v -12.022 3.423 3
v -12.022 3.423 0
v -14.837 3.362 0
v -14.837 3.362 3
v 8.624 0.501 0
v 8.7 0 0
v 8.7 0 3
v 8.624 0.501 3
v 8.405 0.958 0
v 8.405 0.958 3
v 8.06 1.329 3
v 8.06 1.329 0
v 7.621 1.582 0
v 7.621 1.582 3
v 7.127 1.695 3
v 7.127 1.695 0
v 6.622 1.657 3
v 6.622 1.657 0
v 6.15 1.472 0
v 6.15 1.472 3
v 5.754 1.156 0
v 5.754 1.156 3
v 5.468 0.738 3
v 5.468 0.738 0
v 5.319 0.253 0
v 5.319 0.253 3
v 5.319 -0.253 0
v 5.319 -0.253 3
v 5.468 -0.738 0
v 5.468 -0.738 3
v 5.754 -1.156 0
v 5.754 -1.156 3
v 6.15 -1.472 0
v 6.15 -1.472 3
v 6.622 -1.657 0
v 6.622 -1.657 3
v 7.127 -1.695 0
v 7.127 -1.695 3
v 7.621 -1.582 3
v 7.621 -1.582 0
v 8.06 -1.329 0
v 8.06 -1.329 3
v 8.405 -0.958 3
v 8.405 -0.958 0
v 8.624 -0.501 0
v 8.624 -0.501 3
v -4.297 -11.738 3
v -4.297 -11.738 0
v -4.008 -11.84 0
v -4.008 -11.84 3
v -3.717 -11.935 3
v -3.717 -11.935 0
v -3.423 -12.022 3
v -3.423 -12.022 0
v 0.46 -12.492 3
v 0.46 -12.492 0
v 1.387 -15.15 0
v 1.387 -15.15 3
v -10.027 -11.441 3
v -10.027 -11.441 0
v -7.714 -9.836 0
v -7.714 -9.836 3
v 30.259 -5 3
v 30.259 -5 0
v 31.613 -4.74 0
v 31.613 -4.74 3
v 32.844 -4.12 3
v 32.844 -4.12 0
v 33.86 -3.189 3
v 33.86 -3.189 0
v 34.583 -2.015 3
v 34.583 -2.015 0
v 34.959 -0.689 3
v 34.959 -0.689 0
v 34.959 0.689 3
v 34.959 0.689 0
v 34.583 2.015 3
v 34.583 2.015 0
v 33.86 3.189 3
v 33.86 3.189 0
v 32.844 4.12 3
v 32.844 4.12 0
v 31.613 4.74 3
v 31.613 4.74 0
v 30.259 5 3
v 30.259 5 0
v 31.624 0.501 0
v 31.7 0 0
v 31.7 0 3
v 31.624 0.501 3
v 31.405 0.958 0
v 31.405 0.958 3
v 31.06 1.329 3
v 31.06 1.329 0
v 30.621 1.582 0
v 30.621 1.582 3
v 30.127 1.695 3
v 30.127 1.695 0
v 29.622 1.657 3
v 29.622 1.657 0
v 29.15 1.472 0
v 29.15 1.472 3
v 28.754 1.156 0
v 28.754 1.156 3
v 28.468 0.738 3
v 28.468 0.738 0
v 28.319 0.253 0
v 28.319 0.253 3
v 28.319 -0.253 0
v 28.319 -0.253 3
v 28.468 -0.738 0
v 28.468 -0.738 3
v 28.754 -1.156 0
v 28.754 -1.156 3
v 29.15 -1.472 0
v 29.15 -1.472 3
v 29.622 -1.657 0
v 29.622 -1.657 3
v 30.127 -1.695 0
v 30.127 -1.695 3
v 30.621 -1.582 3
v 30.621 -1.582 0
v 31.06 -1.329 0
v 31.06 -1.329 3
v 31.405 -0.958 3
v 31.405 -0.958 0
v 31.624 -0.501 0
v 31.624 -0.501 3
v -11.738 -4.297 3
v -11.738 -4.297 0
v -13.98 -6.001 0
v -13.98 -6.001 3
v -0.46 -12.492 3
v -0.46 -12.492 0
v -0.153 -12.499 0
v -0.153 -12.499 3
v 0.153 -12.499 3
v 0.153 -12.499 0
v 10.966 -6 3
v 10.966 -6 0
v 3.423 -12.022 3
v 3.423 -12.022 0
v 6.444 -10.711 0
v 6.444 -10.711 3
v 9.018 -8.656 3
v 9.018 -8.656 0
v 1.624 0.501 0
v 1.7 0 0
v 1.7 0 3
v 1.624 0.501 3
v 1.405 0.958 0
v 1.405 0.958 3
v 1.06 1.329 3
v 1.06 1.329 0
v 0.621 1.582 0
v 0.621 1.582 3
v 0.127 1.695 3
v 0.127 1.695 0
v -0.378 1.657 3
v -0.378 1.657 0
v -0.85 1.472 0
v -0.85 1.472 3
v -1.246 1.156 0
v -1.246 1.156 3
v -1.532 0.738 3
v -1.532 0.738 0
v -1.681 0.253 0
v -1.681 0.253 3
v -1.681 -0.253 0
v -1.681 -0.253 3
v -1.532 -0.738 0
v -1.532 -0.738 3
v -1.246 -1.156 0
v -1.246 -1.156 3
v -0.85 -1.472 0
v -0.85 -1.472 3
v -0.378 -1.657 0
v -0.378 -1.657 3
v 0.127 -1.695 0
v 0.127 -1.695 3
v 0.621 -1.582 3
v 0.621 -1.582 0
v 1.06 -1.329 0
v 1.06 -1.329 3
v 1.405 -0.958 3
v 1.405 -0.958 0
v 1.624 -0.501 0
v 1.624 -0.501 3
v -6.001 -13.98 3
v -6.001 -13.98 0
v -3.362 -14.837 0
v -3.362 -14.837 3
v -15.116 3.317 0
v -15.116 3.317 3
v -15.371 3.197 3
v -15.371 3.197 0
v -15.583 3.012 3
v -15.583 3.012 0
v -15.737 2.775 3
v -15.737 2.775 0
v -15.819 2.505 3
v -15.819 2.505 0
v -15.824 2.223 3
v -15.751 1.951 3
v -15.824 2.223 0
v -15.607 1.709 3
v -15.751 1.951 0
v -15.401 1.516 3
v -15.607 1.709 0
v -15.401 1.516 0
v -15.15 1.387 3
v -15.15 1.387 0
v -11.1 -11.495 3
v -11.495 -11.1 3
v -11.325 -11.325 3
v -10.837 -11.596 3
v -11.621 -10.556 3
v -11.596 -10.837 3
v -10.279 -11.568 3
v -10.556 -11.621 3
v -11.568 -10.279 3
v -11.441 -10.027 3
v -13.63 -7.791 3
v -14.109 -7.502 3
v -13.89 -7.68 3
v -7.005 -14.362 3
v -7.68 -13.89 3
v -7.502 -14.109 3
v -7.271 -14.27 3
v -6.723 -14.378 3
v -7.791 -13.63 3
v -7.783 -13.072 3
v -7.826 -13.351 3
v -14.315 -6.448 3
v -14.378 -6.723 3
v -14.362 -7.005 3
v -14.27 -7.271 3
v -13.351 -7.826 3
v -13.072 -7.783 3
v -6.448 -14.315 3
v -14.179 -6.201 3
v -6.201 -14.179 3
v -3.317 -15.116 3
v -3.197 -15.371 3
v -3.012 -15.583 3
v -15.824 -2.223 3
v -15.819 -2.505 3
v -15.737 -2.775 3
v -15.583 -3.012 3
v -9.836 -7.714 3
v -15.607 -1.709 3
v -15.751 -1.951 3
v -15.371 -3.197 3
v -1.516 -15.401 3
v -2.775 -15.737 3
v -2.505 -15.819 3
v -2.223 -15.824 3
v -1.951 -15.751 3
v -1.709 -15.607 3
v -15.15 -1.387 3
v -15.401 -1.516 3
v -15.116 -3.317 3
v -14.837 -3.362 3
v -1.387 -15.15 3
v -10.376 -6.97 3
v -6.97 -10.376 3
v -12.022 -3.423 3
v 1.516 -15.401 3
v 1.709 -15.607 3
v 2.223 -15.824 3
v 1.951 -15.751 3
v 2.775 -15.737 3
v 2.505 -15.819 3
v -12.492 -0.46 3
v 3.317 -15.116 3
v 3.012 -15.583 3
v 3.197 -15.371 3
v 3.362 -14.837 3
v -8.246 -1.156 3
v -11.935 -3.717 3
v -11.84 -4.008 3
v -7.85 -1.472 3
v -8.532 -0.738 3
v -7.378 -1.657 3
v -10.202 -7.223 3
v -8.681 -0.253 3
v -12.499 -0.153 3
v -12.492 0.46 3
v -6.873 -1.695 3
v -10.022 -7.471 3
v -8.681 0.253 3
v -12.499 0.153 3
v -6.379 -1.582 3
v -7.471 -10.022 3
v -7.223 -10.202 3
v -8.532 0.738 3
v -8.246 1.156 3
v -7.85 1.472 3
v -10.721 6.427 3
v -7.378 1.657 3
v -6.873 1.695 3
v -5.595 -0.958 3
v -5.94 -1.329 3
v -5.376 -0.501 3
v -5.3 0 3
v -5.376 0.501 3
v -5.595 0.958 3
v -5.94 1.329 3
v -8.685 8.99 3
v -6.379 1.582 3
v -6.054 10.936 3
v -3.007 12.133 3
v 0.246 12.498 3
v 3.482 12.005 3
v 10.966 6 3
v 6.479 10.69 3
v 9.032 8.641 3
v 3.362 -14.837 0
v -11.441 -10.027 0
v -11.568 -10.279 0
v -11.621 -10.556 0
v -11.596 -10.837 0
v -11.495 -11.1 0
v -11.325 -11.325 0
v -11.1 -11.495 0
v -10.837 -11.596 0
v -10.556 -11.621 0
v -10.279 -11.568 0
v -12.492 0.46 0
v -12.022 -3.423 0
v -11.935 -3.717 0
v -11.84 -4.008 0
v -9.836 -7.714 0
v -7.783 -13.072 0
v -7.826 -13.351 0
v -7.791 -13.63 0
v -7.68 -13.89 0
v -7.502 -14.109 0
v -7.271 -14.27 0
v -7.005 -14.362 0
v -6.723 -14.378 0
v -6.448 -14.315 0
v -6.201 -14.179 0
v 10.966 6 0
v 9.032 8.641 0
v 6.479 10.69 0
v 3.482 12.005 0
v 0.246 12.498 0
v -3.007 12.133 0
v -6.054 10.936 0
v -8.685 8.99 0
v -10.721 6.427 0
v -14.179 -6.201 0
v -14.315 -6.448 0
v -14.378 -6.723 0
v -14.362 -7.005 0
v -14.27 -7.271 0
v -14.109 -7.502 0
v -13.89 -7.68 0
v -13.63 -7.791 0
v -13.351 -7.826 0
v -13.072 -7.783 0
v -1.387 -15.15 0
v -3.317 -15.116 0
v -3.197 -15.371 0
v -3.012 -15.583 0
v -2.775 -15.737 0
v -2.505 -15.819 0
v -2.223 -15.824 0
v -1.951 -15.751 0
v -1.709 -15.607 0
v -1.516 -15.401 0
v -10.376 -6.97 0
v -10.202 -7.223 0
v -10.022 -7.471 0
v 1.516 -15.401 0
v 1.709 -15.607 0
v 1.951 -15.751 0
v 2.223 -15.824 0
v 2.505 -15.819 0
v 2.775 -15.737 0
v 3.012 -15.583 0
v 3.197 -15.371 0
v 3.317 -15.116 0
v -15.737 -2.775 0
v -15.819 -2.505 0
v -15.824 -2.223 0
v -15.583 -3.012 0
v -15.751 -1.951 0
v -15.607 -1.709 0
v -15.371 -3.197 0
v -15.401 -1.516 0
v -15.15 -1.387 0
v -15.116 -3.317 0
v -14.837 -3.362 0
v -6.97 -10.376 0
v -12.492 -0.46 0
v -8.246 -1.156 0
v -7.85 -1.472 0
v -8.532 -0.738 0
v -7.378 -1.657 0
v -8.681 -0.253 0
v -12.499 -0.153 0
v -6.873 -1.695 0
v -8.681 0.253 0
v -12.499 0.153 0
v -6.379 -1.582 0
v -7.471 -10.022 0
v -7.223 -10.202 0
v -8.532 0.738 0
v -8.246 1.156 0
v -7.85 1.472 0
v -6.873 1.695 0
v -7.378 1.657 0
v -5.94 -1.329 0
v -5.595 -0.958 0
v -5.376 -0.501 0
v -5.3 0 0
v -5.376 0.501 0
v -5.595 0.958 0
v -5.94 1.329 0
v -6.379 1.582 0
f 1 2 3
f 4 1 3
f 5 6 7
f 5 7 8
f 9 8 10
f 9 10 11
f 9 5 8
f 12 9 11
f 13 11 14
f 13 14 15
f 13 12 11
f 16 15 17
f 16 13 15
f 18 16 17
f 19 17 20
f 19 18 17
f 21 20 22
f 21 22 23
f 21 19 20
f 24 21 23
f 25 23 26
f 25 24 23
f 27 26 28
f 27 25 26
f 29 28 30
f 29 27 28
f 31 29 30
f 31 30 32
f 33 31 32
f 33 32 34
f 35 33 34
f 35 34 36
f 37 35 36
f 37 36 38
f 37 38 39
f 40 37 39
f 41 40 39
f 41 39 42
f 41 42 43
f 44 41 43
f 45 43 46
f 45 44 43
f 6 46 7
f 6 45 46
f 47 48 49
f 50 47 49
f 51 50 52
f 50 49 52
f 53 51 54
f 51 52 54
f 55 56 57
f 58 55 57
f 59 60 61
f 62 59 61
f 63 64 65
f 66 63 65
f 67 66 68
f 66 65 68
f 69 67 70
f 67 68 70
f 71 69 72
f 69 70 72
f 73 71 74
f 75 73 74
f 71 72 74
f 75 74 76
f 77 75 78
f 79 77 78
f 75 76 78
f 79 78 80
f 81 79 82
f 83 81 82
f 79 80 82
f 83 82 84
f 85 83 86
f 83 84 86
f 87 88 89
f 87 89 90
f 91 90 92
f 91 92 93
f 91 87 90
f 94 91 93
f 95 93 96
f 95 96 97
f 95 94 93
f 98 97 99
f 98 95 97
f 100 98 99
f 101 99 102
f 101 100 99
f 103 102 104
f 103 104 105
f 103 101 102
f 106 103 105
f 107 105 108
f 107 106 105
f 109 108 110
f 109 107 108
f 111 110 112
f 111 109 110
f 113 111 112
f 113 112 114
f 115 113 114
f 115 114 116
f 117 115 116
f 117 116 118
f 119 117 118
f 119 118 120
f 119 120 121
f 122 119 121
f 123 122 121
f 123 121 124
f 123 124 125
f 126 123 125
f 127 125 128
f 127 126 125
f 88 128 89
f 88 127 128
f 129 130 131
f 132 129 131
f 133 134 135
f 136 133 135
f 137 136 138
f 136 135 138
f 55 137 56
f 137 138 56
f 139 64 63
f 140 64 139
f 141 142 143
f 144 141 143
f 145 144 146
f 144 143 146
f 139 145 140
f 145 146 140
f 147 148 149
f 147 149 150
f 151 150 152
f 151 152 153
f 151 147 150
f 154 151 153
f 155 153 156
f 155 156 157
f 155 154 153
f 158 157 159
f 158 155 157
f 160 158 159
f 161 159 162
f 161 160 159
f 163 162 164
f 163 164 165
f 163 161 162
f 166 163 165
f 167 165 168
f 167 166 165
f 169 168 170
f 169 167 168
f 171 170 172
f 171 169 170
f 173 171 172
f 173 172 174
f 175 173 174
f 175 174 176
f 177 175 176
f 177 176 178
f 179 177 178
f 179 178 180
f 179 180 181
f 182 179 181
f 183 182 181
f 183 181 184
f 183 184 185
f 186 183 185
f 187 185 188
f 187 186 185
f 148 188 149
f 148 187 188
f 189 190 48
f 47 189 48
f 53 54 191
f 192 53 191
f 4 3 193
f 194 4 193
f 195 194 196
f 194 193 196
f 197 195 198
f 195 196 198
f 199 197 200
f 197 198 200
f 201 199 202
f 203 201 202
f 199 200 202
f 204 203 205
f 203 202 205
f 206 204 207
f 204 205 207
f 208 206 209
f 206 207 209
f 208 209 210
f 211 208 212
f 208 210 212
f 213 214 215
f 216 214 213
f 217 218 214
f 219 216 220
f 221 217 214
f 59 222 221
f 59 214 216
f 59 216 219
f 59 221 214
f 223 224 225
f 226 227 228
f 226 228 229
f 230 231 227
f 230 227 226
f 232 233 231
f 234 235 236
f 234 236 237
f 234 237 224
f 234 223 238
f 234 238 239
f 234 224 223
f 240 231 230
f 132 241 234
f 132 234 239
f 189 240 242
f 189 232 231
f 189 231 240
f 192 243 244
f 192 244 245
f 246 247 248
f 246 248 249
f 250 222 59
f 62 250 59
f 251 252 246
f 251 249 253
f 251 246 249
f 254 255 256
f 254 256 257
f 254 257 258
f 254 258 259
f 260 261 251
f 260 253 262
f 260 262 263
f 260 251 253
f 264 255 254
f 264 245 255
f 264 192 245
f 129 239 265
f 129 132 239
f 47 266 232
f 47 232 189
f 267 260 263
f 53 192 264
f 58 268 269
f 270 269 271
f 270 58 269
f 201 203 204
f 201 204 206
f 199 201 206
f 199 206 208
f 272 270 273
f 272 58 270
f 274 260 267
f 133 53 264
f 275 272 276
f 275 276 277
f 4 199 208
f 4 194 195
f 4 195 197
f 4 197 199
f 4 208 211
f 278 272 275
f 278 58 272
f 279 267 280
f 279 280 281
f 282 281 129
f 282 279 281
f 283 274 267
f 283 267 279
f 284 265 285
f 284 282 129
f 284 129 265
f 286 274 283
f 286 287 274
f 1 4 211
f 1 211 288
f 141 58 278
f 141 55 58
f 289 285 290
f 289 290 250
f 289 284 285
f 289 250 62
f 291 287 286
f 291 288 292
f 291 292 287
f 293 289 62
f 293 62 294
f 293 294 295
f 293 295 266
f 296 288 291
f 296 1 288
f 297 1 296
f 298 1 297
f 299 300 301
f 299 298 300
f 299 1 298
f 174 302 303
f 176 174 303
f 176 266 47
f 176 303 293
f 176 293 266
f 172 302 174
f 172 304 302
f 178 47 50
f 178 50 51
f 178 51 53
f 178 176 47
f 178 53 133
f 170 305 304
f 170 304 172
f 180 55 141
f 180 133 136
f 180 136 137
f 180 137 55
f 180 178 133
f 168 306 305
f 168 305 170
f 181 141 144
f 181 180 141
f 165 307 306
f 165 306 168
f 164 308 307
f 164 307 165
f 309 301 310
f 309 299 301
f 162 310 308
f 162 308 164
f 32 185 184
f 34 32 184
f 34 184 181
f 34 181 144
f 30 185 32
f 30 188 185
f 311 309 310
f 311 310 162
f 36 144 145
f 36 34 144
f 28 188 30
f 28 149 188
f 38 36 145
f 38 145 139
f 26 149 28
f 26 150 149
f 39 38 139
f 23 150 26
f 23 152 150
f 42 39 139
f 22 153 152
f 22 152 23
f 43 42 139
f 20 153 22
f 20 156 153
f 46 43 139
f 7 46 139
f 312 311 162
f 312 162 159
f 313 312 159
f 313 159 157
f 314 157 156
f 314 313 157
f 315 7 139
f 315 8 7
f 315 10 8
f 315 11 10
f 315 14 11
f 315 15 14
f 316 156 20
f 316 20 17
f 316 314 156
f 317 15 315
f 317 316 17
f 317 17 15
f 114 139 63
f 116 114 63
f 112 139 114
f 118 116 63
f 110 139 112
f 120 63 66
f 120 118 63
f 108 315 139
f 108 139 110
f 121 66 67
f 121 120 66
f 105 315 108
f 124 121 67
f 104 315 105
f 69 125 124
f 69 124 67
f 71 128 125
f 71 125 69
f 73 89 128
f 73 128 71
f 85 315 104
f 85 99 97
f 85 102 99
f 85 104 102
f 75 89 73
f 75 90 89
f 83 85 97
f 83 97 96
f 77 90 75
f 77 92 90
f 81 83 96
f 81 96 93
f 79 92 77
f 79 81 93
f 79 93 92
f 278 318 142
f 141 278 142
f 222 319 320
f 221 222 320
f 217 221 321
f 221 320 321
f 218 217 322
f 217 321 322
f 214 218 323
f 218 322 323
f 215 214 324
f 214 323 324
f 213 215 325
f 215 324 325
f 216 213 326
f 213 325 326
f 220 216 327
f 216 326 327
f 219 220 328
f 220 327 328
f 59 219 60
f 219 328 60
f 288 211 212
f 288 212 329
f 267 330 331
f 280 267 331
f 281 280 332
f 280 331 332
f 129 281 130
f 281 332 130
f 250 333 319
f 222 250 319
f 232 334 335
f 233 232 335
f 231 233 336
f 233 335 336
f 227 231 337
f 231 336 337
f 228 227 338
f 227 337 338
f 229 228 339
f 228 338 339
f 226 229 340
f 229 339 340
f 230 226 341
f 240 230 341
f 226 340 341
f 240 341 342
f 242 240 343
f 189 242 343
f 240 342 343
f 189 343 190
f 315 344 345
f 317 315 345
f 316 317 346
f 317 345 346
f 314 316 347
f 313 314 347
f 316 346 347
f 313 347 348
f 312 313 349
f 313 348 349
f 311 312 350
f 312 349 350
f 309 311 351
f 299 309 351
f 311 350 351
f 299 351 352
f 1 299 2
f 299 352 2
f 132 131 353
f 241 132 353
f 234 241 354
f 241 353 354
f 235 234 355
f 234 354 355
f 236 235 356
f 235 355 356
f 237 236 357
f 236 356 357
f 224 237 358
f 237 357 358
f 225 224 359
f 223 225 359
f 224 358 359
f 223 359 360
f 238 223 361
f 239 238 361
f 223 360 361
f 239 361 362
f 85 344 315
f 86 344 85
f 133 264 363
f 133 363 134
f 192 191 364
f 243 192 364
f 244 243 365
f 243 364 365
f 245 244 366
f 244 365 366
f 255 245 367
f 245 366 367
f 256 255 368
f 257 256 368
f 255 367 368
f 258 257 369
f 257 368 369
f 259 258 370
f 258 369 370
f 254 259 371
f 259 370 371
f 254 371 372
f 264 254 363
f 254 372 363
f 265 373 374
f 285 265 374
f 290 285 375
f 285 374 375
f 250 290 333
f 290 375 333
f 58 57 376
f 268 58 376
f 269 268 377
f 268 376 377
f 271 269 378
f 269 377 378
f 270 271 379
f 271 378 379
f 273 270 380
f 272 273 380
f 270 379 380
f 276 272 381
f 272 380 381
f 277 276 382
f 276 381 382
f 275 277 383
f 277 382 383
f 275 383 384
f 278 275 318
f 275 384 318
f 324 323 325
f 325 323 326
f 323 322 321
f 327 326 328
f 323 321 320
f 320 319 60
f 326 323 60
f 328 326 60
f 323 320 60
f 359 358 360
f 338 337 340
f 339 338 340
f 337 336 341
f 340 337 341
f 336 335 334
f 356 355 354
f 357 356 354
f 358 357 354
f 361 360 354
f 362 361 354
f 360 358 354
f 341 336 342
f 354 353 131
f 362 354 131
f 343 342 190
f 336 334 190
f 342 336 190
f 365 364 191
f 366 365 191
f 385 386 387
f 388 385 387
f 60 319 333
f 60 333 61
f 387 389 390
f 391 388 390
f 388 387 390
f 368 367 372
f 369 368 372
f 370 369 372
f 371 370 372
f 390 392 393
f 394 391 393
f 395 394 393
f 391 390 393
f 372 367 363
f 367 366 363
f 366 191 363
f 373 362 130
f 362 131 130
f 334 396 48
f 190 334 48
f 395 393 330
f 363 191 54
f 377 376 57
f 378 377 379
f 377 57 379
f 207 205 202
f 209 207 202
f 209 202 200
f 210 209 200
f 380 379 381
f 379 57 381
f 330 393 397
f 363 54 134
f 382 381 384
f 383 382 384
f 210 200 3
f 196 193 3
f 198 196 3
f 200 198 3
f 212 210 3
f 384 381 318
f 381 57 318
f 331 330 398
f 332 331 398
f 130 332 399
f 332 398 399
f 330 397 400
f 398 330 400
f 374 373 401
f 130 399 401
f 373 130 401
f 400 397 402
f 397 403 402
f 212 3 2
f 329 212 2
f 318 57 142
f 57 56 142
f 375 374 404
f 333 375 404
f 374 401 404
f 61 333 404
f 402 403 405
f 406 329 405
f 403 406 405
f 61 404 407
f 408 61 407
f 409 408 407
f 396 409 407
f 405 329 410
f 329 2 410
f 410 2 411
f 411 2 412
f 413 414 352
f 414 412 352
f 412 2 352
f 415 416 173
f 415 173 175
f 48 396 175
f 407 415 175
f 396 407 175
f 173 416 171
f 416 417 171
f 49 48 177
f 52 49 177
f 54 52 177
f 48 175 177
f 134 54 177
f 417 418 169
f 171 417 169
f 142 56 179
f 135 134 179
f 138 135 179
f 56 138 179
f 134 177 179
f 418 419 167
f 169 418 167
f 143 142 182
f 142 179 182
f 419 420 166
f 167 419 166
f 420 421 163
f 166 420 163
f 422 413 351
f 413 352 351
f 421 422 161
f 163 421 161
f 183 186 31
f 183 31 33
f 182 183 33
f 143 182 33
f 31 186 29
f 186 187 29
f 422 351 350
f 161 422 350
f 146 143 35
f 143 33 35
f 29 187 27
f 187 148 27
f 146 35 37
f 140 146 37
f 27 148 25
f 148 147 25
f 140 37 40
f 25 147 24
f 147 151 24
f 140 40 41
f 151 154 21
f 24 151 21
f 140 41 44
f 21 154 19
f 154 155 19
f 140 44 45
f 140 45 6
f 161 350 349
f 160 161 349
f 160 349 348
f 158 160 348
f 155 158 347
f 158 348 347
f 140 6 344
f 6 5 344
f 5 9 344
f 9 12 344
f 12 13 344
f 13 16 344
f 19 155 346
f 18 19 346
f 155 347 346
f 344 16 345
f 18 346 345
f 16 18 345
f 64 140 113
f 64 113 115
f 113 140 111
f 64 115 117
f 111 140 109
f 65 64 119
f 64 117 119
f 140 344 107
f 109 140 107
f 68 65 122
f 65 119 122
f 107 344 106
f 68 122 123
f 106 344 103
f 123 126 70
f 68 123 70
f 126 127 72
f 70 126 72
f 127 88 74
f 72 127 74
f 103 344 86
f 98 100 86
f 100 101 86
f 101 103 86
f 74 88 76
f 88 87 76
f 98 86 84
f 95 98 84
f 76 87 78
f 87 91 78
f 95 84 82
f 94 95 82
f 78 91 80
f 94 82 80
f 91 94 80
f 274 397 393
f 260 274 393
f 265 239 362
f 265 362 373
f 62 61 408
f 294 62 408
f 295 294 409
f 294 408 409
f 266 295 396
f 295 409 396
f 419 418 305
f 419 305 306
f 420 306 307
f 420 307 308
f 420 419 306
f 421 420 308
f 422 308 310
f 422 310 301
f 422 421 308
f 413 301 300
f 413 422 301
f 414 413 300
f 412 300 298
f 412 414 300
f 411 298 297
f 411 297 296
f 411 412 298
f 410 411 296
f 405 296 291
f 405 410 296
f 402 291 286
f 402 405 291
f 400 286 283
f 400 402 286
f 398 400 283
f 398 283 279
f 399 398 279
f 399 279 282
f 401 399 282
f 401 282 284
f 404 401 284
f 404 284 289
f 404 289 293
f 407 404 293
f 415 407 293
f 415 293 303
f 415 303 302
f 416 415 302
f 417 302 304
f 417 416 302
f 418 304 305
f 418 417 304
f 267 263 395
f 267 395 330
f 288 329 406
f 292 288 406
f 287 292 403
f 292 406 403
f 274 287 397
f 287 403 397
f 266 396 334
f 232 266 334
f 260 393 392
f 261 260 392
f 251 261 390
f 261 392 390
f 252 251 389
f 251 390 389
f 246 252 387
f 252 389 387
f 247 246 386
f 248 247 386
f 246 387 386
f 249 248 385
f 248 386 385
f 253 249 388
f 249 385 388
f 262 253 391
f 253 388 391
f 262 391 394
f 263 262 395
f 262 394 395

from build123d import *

# Parameters (mm, degrees)
SKETCH_R  = 1.7
PAD_DEPTH = 3


with BuildPart() as part:
    # Sketch → Pad (new body)
    with BuildSketch(Plane.XY):
        with BuildLine():
            ThreePointArc((-10.376114, -6.970384), (-10.112712, -7.347316), (-9.835625, -7.714304))
            Line((-9.835625, -7.714304), (-11.441309, -10.027096))
            ThreePointArc((-11.441309, -10.027096), (-11.325129, -11.325129), (-10.027096, -11.441309))
            Line((-10.027096, -11.441309), (-7.714304, -9.835625))
            ThreePointArc((-7.714304, -9.835625), (-7.347316, -10.112712), (-6.970384, -10.376114))
            Line((-6.970384, -10.376114), (-7.782789, -13.071894))
            ThreePointArc((-7.782789, -13.071894), (-7.271181, -14.270495), (-6.000776, -13.979875))
            Line((-6.000776, -13.979875), (-4.297364, -11.738086))
            ThreePointArc((-4.297364, -11.738086), (-3.862712, -11.888206), (-3.422833, -12.022238))
            Line((-3.422833, -12.022238), (-3.362435, -14.837123))
            ThreePointArc((-3.362435, -14.837123), (-2.505478, -15.818966), (-1.387058, -15.149992))
            Line((-1.387058, -15.149992), (-0.459768, -12.491542))
            ThreePointArc((-0.459768, -12.491542), (0, -12.5), (0.459768, -12.491542))
            Line((0.459768, -12.491542), (1.387058, -15.149992))
            ThreePointArc((1.387058, -15.149992), (2.505478, -15.818966), (3.362435, -14.837123))
            Line((3.362435, -14.837123), (3.422833, -12.022238))
            ThreePointArc((3.422833, -12.022238), (7.799066, -9.76855), (10.965856, -6))
            Line((30.259157, -5), (10.965856, -6))
            ThreePointArc((30.259157, -5), (35.006712, 0), (30.259157, 5))
            Line((10.965856, 6), (30.259157, 5))
            ThreePointArc((10.965856, 6), (-1.392635, 12.42218), (-12.022238, 3.422833))
            Line((-12.022238, 3.422833), (-14.837123, 3.362435))
            ThreePointArc((-14.837123, 3.362435), (-15.818966, 2.505478), (-15.149992, 1.387058))
            Line((-15.149992, 1.387058), (-12.491542, 0.459768))
            ThreePointArc((-12.491542, 0.459768), (-12.5, 0), (-12.491542, -0.459768))
            Line((-12.491542, -0.459768), (-15.149992, -1.387058))
            ThreePointArc((-15.149992, -1.387058), (-15.818966, -2.505478), (-14.837123, -3.362435))
            Line((-14.837123, -3.362435), (-12.022238, -3.422833))
            ThreePointArc((-12.022238, -3.422833), (-11.888206, -3.862712), (-11.738086, -4.297364))
            Line((-11.738086, -4.297364), (-13.979875, -6.000776))
            ThreePointArc((-13.979875, -6.000776), (-14.270495, -7.271181), (-13.071894, -7.782789))
            Line((-13.071894, -7.782789), (-10.376114, -6.970384))
        make_face()
        Circle(SKETCH_R, mode=Mode.SUBTRACT)
        with Locations((7, 0)):
            Circle(SKETCH_R, mode=Mode.SUBTRACT)
        with Locations((-7, 0)):
            Circle(SKETCH_R, mode=Mode.SUBTRACT)
        with Locations((30, 0)):
            Circle(SKETCH_R, mode=Mode.SUBTRACT)
    extrude(amount=PAD_DEPTH)


solid = part.part
